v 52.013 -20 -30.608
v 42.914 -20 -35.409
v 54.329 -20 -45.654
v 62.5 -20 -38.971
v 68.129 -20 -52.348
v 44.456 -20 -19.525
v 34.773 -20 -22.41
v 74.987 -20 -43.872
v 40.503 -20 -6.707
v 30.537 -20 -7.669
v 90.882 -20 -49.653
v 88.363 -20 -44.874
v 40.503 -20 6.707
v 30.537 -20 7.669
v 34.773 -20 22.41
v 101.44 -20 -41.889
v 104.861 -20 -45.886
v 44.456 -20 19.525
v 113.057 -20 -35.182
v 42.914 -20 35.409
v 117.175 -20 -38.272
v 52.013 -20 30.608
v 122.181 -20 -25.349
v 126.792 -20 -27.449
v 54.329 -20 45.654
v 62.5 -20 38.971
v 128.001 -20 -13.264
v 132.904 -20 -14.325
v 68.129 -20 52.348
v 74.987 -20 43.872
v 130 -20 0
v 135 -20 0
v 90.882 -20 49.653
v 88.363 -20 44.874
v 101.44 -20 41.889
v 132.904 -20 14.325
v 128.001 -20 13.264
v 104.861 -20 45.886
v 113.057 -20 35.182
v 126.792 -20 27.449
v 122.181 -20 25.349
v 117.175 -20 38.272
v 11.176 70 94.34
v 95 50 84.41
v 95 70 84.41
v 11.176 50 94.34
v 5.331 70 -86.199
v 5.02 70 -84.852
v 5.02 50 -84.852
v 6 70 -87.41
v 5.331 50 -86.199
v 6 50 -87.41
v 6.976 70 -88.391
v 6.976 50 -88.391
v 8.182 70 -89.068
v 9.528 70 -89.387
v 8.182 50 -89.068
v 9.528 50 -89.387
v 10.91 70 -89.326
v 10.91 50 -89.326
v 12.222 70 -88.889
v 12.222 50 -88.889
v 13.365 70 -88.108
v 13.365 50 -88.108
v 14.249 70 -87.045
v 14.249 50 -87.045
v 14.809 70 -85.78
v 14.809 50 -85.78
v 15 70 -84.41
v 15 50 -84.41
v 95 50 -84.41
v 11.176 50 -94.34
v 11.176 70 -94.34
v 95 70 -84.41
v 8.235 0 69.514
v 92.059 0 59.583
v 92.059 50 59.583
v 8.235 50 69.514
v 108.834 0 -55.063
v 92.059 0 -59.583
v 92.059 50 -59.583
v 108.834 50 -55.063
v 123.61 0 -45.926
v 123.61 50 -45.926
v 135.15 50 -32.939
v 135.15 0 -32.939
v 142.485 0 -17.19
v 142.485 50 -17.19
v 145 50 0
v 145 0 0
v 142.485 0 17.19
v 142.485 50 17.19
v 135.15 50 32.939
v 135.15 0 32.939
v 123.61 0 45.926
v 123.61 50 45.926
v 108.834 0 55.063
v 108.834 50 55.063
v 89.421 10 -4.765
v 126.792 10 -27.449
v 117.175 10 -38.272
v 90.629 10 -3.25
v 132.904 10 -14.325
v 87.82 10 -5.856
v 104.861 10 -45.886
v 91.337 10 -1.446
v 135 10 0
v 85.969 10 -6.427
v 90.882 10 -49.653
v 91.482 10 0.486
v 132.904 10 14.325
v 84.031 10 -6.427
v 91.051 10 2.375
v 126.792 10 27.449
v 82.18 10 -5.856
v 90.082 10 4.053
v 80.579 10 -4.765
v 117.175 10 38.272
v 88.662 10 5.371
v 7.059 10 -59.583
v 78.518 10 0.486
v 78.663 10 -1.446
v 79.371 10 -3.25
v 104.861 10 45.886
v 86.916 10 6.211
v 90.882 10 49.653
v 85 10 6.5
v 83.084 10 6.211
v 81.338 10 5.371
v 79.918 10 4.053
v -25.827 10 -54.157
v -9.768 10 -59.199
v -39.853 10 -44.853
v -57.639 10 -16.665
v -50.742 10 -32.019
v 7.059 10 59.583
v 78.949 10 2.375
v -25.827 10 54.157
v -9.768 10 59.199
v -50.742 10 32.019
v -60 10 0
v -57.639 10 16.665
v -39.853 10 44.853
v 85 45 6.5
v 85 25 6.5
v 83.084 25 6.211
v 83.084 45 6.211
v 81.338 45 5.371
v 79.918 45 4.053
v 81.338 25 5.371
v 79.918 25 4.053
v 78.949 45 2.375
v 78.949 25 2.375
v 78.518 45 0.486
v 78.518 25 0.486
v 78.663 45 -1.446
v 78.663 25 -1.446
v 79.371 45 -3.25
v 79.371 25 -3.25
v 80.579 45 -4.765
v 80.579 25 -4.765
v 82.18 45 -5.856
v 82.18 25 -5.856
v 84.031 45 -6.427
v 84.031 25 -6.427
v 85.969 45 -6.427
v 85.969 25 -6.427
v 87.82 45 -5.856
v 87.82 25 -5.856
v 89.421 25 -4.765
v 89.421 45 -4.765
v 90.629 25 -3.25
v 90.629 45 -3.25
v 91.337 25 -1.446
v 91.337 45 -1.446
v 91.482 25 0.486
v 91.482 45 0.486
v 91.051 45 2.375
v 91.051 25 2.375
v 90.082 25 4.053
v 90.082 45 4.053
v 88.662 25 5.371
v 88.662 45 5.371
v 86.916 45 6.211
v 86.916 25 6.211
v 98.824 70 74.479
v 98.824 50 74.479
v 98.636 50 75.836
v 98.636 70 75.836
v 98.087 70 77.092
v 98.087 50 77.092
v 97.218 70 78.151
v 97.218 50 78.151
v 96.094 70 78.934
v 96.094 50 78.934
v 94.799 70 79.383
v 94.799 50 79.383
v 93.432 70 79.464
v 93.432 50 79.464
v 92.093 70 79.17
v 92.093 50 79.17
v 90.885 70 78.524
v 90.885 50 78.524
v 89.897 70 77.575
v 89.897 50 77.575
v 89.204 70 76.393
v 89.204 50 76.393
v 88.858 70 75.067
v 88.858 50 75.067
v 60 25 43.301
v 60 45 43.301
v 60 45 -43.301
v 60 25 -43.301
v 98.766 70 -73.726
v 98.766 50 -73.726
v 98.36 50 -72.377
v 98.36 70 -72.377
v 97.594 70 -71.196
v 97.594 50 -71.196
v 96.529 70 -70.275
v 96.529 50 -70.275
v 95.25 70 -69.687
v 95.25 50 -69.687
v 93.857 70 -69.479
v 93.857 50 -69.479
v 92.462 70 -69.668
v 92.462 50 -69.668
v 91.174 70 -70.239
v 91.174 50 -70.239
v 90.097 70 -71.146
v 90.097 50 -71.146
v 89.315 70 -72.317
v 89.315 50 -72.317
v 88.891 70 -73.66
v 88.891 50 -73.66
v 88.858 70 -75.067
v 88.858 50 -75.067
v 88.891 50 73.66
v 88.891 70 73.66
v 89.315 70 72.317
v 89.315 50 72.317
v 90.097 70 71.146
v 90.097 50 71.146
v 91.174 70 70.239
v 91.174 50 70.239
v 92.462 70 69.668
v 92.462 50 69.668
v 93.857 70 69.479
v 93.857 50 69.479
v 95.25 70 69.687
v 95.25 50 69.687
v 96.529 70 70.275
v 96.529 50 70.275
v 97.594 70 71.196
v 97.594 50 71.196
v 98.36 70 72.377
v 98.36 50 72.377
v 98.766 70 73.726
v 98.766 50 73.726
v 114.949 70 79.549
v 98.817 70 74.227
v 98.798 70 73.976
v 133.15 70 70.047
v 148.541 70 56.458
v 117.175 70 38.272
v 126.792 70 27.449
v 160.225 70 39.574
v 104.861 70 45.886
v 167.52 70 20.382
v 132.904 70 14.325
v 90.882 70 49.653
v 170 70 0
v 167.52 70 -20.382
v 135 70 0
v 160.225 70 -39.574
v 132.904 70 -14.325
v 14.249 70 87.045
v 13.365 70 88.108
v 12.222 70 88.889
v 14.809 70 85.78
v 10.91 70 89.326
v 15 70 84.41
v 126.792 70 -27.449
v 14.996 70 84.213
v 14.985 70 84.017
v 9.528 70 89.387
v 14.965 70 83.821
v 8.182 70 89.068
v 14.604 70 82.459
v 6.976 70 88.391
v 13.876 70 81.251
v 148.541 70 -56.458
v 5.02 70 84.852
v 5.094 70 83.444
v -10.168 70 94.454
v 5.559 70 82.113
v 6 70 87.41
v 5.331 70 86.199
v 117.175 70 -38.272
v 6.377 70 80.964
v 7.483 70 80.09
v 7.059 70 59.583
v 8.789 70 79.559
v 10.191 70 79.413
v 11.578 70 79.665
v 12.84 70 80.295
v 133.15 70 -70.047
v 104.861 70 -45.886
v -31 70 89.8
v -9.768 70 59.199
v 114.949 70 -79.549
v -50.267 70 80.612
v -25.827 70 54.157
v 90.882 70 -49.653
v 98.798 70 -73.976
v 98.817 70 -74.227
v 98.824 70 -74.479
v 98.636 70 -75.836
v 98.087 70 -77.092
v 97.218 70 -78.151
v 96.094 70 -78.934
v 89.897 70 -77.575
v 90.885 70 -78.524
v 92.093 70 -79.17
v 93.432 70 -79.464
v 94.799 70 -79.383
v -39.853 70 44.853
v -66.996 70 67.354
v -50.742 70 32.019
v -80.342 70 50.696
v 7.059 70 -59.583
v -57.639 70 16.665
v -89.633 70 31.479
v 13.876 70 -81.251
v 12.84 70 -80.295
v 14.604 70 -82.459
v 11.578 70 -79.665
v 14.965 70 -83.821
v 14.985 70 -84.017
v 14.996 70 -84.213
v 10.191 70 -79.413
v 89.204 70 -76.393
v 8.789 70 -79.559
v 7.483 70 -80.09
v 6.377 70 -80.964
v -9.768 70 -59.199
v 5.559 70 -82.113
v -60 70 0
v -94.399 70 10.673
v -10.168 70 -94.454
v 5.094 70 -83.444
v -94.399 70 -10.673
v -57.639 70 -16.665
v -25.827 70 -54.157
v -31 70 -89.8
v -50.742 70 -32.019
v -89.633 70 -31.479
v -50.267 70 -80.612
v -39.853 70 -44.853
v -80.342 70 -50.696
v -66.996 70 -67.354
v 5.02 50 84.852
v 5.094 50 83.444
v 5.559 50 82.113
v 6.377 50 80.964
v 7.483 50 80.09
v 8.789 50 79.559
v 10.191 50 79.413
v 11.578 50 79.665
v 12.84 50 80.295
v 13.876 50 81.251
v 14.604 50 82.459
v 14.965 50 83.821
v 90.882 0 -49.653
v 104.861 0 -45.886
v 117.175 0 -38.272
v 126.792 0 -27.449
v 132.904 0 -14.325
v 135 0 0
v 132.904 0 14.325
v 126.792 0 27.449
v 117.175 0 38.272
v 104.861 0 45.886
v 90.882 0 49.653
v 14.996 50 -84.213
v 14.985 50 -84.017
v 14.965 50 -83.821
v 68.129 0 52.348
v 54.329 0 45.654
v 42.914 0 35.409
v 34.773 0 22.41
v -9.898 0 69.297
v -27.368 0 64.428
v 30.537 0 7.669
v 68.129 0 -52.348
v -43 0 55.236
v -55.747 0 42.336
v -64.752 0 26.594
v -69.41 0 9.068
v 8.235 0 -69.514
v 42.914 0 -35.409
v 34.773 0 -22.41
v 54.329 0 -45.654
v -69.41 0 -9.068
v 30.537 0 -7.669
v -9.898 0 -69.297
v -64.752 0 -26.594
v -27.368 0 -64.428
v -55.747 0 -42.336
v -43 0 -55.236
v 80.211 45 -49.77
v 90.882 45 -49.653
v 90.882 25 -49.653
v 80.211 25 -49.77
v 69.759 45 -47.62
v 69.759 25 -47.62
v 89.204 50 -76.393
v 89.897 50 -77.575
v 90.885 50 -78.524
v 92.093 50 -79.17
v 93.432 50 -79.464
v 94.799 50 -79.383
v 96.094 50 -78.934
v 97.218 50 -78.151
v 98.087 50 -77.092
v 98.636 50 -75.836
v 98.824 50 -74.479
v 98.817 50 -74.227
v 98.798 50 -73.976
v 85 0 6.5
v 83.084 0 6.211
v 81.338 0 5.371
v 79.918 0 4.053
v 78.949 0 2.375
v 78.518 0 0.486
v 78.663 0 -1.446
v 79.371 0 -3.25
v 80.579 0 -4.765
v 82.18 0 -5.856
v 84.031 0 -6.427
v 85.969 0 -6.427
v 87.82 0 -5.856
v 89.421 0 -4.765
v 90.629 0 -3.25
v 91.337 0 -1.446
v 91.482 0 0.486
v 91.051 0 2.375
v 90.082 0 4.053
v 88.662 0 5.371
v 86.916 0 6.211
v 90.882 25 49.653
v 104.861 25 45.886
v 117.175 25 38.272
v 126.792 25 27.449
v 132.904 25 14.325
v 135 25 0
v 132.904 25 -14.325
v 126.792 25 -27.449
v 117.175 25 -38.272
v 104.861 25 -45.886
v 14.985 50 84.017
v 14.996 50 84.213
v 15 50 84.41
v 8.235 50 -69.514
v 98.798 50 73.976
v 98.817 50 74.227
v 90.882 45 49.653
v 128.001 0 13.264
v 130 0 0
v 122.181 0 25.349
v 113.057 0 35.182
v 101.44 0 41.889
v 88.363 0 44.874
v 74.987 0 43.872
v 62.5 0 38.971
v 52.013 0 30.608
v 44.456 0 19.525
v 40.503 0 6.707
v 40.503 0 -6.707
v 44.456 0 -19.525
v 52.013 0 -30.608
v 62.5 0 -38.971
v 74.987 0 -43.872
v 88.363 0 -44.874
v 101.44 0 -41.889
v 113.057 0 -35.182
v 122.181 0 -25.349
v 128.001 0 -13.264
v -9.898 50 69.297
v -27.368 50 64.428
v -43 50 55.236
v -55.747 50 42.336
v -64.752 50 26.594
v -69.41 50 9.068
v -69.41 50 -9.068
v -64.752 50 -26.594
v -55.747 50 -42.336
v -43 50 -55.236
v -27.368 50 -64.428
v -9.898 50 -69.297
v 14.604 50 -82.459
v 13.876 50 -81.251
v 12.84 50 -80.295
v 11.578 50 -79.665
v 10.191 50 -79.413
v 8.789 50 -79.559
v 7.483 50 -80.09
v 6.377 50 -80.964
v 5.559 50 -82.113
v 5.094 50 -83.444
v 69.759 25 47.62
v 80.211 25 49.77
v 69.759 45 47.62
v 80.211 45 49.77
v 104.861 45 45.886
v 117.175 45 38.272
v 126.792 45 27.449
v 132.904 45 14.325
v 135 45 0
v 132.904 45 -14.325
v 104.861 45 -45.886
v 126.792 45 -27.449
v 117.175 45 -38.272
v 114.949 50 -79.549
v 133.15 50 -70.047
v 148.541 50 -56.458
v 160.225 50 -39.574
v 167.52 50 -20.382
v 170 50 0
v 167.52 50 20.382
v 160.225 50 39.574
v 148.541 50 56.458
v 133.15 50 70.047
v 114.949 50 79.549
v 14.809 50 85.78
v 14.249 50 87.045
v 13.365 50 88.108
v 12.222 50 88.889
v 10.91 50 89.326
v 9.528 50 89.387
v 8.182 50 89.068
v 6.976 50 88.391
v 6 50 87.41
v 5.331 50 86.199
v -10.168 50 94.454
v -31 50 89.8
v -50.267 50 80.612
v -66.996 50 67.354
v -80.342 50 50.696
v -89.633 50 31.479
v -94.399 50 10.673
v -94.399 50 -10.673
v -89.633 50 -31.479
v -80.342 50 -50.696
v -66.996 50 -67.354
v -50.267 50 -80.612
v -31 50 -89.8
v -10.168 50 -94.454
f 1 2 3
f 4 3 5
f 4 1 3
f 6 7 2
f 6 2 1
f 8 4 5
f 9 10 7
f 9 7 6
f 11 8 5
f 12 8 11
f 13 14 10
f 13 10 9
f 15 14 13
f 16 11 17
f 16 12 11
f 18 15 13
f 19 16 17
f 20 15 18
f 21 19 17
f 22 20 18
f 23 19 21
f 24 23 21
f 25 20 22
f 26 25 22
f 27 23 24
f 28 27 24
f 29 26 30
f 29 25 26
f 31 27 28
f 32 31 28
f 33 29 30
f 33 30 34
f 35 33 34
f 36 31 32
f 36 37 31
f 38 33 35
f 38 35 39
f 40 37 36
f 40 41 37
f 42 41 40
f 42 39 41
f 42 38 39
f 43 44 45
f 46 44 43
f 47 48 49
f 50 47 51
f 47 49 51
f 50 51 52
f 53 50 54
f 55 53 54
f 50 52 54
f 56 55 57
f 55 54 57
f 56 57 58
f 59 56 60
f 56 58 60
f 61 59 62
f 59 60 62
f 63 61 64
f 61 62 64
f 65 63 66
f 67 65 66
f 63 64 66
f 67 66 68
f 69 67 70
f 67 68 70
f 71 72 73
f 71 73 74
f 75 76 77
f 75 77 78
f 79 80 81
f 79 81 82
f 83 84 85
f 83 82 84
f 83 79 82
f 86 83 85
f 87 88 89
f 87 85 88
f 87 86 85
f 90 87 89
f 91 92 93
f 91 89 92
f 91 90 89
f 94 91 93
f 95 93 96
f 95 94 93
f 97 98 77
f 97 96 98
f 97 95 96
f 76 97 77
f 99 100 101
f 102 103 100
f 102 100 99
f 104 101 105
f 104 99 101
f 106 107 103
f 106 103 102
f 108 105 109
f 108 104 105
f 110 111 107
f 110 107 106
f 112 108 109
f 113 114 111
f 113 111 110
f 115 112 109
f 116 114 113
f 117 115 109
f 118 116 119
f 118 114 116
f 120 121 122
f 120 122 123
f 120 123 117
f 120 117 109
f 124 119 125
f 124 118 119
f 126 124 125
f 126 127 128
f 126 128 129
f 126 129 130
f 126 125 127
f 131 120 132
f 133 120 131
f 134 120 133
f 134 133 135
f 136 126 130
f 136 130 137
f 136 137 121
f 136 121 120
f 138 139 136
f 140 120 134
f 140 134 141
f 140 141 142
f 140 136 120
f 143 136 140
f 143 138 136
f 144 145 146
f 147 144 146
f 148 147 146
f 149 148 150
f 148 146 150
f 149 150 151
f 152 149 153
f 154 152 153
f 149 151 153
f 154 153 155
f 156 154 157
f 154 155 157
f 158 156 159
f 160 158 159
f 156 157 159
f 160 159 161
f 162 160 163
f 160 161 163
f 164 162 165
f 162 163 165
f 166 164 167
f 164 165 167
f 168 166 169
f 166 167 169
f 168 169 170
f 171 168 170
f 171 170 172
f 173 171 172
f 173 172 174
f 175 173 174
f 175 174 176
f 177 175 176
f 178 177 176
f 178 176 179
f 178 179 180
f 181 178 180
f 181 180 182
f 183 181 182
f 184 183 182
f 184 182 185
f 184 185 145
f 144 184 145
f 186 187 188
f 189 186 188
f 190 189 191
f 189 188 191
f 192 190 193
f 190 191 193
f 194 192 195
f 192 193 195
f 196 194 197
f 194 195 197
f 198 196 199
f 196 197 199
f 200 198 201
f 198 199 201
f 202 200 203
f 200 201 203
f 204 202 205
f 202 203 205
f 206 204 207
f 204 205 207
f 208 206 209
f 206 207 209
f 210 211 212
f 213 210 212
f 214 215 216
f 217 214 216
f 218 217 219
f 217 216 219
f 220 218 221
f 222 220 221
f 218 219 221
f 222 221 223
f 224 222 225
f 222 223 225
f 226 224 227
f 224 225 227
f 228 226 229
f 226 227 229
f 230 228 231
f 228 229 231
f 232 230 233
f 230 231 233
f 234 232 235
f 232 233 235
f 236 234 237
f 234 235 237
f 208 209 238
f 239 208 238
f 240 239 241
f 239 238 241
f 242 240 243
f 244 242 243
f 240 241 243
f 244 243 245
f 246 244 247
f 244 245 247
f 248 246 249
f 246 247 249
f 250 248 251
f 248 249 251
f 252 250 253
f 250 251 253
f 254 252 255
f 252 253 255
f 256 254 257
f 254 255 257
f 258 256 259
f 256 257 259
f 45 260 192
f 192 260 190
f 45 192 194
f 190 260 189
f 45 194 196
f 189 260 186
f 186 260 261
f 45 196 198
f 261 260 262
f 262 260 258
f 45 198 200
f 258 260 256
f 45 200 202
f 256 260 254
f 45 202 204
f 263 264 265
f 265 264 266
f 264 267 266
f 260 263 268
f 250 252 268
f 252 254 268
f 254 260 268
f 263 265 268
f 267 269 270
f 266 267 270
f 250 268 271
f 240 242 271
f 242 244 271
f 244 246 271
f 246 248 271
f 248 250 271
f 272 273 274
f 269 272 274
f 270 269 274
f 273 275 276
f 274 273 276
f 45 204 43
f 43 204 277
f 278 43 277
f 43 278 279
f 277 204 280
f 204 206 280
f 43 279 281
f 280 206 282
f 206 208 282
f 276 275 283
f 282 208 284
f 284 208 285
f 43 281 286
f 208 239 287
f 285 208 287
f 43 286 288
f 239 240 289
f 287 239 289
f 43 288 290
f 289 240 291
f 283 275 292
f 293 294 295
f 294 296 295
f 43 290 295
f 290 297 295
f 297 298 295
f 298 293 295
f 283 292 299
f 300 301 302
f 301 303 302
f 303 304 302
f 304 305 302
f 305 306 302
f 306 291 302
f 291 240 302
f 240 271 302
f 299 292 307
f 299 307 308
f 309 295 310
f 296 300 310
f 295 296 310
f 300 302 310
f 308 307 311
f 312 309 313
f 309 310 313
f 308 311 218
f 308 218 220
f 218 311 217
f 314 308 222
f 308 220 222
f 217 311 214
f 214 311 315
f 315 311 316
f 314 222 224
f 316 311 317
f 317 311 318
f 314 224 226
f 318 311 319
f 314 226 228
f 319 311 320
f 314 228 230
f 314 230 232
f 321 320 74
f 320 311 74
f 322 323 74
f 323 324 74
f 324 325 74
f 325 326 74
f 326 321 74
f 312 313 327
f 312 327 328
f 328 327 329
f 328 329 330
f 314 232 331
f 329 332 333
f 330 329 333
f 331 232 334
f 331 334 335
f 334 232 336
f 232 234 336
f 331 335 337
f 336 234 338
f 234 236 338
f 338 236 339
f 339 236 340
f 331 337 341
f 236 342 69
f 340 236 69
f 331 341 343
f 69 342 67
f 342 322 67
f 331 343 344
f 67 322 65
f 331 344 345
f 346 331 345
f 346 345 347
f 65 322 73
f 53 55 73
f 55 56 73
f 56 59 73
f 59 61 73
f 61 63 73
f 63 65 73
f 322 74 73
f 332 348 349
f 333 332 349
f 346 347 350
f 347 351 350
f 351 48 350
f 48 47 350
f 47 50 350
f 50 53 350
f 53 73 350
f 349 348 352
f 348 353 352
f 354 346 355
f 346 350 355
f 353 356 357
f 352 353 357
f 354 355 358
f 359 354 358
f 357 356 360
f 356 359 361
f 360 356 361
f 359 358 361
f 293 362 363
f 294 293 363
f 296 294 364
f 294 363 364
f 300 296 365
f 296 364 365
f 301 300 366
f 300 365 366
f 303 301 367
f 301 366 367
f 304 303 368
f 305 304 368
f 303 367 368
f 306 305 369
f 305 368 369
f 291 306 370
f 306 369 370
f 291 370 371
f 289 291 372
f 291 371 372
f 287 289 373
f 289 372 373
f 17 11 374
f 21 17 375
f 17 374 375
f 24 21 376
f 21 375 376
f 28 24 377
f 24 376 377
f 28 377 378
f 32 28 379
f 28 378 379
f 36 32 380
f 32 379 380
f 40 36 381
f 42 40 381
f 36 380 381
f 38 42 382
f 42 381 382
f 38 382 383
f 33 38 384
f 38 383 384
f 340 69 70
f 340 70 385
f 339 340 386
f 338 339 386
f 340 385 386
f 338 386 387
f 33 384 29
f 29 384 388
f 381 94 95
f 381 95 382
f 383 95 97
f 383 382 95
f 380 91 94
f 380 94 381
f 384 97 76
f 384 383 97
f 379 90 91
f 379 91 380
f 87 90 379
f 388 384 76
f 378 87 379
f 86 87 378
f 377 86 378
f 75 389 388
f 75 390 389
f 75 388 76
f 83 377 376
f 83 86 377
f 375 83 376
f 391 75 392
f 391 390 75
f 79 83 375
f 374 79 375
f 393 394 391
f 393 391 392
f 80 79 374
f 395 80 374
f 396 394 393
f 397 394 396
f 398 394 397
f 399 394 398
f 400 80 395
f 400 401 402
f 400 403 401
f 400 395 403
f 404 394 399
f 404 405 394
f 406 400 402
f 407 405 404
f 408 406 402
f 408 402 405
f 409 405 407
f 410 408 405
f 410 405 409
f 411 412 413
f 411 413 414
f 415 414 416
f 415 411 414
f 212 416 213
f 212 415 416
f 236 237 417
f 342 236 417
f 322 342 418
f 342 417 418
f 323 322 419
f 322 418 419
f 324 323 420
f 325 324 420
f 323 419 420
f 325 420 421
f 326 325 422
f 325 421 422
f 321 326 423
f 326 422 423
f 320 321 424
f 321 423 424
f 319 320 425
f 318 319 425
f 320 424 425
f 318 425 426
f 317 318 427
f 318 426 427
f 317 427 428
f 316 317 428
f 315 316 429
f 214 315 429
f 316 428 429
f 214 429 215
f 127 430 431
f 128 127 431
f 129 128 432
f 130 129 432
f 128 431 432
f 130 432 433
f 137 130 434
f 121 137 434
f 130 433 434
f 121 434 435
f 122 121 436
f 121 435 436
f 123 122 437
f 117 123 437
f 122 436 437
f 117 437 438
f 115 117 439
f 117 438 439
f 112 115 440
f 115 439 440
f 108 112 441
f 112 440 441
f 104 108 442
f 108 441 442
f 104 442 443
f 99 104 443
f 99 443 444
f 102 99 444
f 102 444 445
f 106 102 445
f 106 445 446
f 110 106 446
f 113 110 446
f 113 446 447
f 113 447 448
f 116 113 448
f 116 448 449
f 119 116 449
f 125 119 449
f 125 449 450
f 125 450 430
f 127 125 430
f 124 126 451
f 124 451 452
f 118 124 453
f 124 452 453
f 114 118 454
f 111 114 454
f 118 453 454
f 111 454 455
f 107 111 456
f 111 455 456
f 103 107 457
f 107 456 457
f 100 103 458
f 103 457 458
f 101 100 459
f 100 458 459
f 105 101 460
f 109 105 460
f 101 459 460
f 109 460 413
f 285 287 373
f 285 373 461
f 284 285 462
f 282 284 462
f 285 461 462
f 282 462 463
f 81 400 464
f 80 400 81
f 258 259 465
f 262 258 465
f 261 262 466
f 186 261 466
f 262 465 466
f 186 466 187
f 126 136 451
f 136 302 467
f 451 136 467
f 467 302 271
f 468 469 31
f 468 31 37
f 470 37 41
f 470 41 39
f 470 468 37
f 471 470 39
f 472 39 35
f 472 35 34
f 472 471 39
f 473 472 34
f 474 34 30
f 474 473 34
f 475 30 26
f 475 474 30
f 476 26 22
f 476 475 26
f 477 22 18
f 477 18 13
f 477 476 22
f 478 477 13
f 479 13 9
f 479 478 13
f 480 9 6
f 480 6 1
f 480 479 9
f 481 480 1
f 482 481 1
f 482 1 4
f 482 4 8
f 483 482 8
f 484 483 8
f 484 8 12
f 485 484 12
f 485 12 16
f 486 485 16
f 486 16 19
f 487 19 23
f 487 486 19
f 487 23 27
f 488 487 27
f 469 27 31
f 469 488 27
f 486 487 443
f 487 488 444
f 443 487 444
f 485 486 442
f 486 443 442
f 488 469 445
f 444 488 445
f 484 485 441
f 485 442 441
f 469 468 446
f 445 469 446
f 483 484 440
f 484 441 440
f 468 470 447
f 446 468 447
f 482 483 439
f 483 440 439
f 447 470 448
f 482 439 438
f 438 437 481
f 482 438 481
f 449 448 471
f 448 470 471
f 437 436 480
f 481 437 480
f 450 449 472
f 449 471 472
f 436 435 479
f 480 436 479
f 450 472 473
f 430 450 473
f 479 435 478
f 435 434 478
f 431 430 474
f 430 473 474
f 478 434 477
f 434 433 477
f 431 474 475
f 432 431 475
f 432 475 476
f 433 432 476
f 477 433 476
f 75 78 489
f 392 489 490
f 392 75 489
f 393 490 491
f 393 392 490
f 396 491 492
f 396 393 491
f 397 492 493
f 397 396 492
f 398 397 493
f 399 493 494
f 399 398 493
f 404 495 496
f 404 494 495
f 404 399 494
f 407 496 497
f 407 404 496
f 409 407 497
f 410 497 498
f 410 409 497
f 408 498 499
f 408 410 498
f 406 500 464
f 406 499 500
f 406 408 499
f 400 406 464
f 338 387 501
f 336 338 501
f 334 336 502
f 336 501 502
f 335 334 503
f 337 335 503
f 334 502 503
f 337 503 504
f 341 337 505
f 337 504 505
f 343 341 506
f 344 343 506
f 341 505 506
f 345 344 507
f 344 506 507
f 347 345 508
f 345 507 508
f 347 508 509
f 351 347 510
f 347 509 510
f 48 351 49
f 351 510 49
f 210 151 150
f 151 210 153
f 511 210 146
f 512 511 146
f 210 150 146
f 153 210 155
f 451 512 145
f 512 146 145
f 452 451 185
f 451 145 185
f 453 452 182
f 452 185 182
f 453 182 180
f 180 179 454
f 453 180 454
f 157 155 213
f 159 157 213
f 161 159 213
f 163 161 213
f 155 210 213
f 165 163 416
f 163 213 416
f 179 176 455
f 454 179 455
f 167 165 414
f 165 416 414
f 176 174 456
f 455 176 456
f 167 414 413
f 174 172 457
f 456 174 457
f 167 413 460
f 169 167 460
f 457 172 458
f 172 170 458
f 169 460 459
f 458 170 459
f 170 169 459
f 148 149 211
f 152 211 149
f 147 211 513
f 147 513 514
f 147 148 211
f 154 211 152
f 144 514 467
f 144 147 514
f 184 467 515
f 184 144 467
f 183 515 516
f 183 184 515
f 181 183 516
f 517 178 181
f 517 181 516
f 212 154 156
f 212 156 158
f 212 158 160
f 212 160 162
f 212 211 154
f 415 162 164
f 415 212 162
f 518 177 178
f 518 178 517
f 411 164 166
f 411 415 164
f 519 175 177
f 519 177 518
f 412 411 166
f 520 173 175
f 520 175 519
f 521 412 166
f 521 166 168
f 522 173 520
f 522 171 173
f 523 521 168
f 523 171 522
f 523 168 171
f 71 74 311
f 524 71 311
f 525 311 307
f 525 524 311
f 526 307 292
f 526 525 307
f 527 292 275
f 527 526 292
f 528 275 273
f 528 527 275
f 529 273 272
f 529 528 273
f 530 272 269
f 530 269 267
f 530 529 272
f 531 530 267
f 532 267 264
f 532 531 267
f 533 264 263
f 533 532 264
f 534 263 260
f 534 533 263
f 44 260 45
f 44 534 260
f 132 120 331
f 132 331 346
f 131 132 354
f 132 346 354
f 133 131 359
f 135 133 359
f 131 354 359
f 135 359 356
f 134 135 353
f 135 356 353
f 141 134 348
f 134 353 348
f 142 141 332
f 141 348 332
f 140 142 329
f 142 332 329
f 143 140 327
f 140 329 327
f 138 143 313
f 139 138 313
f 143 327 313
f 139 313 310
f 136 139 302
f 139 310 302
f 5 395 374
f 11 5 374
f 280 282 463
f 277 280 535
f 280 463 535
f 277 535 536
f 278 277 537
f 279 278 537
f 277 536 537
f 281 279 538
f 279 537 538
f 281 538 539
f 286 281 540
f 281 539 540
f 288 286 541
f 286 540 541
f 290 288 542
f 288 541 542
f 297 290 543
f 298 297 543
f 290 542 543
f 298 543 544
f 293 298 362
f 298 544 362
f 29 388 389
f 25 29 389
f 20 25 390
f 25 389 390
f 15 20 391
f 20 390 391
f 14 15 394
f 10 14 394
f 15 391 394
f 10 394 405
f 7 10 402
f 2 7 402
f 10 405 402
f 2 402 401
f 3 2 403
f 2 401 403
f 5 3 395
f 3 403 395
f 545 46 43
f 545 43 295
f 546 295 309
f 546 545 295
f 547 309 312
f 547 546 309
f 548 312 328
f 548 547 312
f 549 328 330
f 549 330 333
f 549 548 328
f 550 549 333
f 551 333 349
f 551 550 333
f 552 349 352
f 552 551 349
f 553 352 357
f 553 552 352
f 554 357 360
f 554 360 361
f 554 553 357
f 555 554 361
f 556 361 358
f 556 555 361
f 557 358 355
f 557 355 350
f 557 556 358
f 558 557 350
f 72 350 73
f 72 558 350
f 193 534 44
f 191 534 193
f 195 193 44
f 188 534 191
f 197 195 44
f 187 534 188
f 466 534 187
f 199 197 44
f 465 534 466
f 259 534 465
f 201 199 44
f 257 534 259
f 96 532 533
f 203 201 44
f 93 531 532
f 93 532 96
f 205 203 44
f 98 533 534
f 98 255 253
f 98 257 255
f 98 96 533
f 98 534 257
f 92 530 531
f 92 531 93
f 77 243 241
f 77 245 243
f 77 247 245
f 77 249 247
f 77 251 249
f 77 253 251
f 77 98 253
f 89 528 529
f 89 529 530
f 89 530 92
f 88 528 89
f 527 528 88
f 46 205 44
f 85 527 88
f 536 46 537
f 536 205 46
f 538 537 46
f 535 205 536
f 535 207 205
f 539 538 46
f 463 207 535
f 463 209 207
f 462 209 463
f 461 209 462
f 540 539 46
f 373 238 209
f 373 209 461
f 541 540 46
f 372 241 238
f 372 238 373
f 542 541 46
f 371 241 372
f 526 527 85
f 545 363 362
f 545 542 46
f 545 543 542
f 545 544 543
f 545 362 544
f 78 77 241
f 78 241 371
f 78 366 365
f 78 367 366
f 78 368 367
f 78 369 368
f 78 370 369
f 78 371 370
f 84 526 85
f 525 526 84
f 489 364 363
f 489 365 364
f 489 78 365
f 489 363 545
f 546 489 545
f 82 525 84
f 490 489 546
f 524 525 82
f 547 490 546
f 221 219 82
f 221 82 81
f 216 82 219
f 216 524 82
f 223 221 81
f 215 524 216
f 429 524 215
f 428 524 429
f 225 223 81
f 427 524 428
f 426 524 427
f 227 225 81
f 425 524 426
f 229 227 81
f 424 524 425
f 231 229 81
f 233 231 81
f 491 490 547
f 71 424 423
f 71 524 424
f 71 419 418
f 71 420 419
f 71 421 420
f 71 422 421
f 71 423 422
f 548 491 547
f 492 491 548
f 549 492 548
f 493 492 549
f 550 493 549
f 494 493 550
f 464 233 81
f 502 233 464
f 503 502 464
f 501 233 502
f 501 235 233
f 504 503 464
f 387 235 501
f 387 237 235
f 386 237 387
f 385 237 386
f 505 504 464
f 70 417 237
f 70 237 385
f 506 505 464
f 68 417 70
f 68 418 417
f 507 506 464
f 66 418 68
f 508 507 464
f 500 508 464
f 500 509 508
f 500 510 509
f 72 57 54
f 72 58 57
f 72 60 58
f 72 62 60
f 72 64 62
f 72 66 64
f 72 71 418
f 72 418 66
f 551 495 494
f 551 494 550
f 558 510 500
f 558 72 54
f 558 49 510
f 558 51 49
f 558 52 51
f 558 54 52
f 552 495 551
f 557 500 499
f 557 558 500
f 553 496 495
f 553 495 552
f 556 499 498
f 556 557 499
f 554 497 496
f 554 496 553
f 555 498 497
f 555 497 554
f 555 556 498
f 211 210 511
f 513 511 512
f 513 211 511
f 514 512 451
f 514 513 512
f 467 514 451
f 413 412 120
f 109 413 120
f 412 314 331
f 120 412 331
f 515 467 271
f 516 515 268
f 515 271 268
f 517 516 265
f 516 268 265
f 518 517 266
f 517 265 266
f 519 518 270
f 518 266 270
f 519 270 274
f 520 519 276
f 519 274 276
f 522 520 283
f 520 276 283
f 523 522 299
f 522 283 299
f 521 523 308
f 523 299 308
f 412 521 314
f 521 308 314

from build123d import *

# Parameters (mm, degrees)
EXTRUDE_2_DEPTH     = 70
CUT_EXTRUDE_1_DEPTH = 90
EXTRUDE_3_OUTLINE_R = 45
EXTRUDE_3_DEPTH     = 20
EXTRUDE_START       = -10
EXTRUDE_4_DEPTH     = 10
EXTRUDE_START_2     = -20
EXTRUDE_5_DEPTH     = 20
CUT_EXTRUDE_2_DEPTH = 207.942020866
EXTRUDE_START_3     = 35
SKETCH_13_R         = 50
EXTRUDE_6_DEPTH     = 35
CUT_EXTRUDE_START   = 15
CUT_EXTRUDE_3_DEPTH = 15
SKETCH_15_R         = 6.5
CUT_EXTRUDE_4_DEPTH = 207.942020866
CUT_EXTRUDE_5_REACH = 207.305


# Read off the part's stored shape, not the designer's step: 凸台-拉伸3
with BuildPart() as part:
    # 草图1 → 凸台-拉伸2 (new body)
    with BuildSketch(Plane(origin=(0, 0, 0), x_dir=(1, 0, 0), z_dir=(0, 1, 0))):
        with BuildLine():
            Line((8.235294118, 69.513883008), (92.058823529, 59.583328292))
            ThreePointArc((92.058823529, 59.583328292), (145, 0), (92.058823529, -59.583328292))
            Line((92.058823529, -59.583328292), (8.235294118, -69.513883008))
            ThreePointArc((8.235294118, -69.513883008), (-70, 0), (8.235294118, 69.513883008))
        make_face()
    extrude(amount=EXTRUDE_2_DEPTH)

    # 草图2 → 切除-拉伸1 (cut)
    with BuildSketch(Plane(origin=(0, 70, 0), x_dir=(1, 0, 0), z_dir=(0, 1, 0))):
        with BuildLine():
            Line((7.058823529, -59.583328292), (90.882352941, -49.652773577))
            ThreePointArc((90.882352941, -49.652773577), (135, 0), (90.882352941, 49.652773577))
            Line((90.882352941, 49.652773577), (7.058823529, 59.583328292))
            ThreePointArc((7.058823529, 59.583328292), (-60, 0), (7.058823529, -59.583328292))
        make_face()
    extrude(amount=-CUT_EXTRUDE_1_DEPTH, mode=Mode.SUBTRACT)



with BuildPart() as body_2:
    # 凸台-拉伸3 outline → 凸台-拉伸3 (new body)
    with BuildSketch(Plane.XZ):
        with BuildLine():
            ThreePointArc((90.882352941, -49.652773577), (135, 0), (90.882352941, 49.652773577))
            Line((90.882352941, 49.652773577), (68.128593603, 52.348406339))
            ThreePointArc((68.128593603, 52.348406339), (30, 0), (68.128593603, -52.348406339))
            Line((68.128593603, -52.348406339), (90.882352941, -49.652773577))
        make_face()
        with Locations((85, 0)):
            Circle(EXTRUDE_3_OUTLINE_R, mode=Mode.SUBTRACT)
    extrude(amount=EXTRUDE_3_DEPTH)


with BuildPart() as part_1:
    add(part.part)

    add(body_2.part)  # 凸台-拉伸4 merges body 2
    # 草图8 → 凸台-拉伸4 (add)
    with BuildSketch(Plane.XZ.offset(EXTRUDE_START)):
        with BuildLine():
            Line((90.882352941, -49.652773577), (7.058823529, -59.583328292))
            ThreePointArc((7.058823529, -59.583328292), (-60, 0), (7.058823529, 59.583328292))
            Line((7.058823529, 59.583328292), (90.882352941, 49.652773577))
            ThreePointArc((90.882352941, 49.652773577), (135, 0), (90.882352941, -49.652773577))
        make_face()
    extrude(amount=EXTRUDE_4_DEPTH)

    # 草图9 → 凸台-拉伸5 (add)
    with BuildSketch(Plane(origin=(0, 70, 0), x_dir=(1, 0, 0), z_dir=(0, 1, 0)).offset(EXTRUDE_START_2)):
        with BuildLine():
            Line((11.176470588, 94.340269796), (95, 84.409715081))
            ThreePointArc((95, 84.409715081), (170, 0), (95, -84.409715081))
            Line((95, -84.409715081), (11.176470588, -94.340269796))
            ThreePointArc((11.176470588, -94.340269796), (-95, 0), (11.176470588, 94.340269796))
        make_face()
        with BuildLine():
            Line((8.235294118, -69.513883008), (92.058823529, -59.583328292))
            ThreePointArc((92.058823529, -59.583328292), (145, 0), (92.058823529, 59.583328292))
            Line((92.058823529, 59.583328292), (8.235294118, 69.513883008))
            ThreePointArc((8.235294118, 69.513883008), (-70, 0), (8.235294118, -69.513883008))
        make_face(mode=Mode.SUBTRACT)
    extrude(amount=EXTRUDE_5_DEPTH)

    # 草图10 → 切除-拉伸2 (cut, through all)
    with BuildSketch(Plane.XZ.offset(-50)):
        with BuildLine():
            ThreePointArc((88.858252054, 75.067395659), (93.152609723, 69.524378153), (98.766439672, 73.725742714))
            ThreePointArc((98.766439672, 73.725742714), (96.301264767, 74.143653907), (93.823529412, 74.479160365))
            Line((93.823529412, 74.479160365), (88.858252054, 75.067395659))
        make_face()
        with BuildLine():
            ThreePointArc((93.823529412, 74.479160365), (96.301264767, 74.143653907), (98.766439672, 73.725742714))
            ThreePointArc((98.766439672, 73.725742714), (98.809236548, 74.101371603), (98.823529412, 74.479160365))
            ThreePointArc((98.823529412, 74.479160365), (94.11815902, 79.470472156), (88.858252054, 75.067395659))
            Line((88.858252054, 75.067395659), (93.823529412, 74.479160365))
        make_face()
        with BuildLine():
            ThreePointArc((88.858252054, 75.067395659), (93.152609723, 69.524378153), (98.766439672, 73.725742714))
            ThreePointArc((98.766439672, 73.725742714), (96.301264767, 74.143653907), (93.823529412, 74.479160365))
            Line((93.823529412, 74.479160365), (88.858252054, 75.067395659))
        make_face()
        with BuildLine():
            ThreePointArc((93.823529412, 74.479160365), (96.301264767, 74.143653907), (98.766439672, 73.725742714))
            ThreePointArc((98.766439672, 73.725742714), (98.809236548, 74.101371603), (98.823529412, 74.479160365))
            ThreePointArc((98.823529412, 74.479160365), (94.11815902, 79.470472156), (88.858252054, 75.067395659))
            Line((88.858252054, 75.067395659), (93.823529412, 74.479160365))
        make_face()
        with BuildLine():
            ThreePointArc((10, 84.409715081), (7.513035126, 84.667315436), (5.01956968, 84.851658323))
            ThreePointArc((5.01956968, 84.851658323), (9.484855013, 79.436323316), (14.965277358, 83.821479787))
            Line((14.965277358, 83.821479787), (10, 84.409715081))
        make_face()
        with BuildLine():
            ThreePointArc((15, 84.409715081), (10.221188156, 89.404820265), (5.01956968, 84.851658323))
            ThreePointArc((5.01956968, 84.851658323), (7.513035126, 84.667315436), (10, 84.409715081))
            Line((10, 84.409715081), (14.965277358, 83.821479787))
            ThreePointArc((14.965277358, 83.821479787), (14.991311791, 84.115085473), (15, 84.409715081))
        make_face()
        with BuildLine():
            ThreePointArc((10, 84.409715081), (7.513035126, 84.667315436), (5.01956968, 84.851658323))
            ThreePointArc((5.01956968, 84.851658323), (9.484855013, 79.436323316), (14.965277358, 83.821479787))
            Line((14.965277358, 83.821479787), (10, 84.409715081))
        make_face()
        with BuildLine():
            ThreePointArc((15, 84.409715081), (10.221188156, 89.404820265), (5.01956968, 84.851658323))
            ThreePointArc((5.01956968, 84.851658323), (7.513035126, 84.667315436), (10, 84.409715081))
            Line((10, 84.409715081), (14.965277358, 83.821479787))
            ThreePointArc((14.965277358, 83.821479787), (14.991311791, 84.115085473), (15, 84.409715081))
        make_face()
        with BuildLine():
            ThreePointArc((5.01956968, -84.851658323), (7.513035126, -84.667315436), (10, -84.409715081))
            Line((10, -84.409715081), (14.965277358, -83.821479787))
            ThreePointArc((14.965277358, -83.821479787), (9.484855013, -79.436323316), (5.01956968, -84.851658323))
        make_face()
        with BuildLine():
            Line((14.965277358, -83.821479787), (10, -84.409715081))
            ThreePointArc((10, -84.409715081), (7.513035126, -84.667315436), (5.01956968, -84.851658323))
            ThreePointArc((5.01956968, -84.851658323), (10.221188156, -89.404820265), (15, -84.409715081))
            ThreePointArc((15, -84.409715081), (14.991311791, -84.115085473), (14.965277358, -83.821479787))
        make_face()
        with BuildLine():
            ThreePointArc((5.01956968, -84.851658323), (7.513035126, -84.667315436), (10, -84.409715081))
            Line((10, -84.409715081), (14.965277358, -83.821479787))
            ThreePointArc((14.965277358, -83.821479787), (9.484855013, -79.436323316), (5.01956968, -84.851658323))
        make_face()
        with BuildLine():
            Line((14.965277358, -83.821479787), (10, -84.409715081))
            ThreePointArc((10, -84.409715081), (7.513035126, -84.667315436), (5.01956968, -84.851658323))
            ThreePointArc((5.01956968, -84.851658323), (10.221188156, -89.404820265), (15, -84.409715081))
            ThreePointArc((15, -84.409715081), (14.991311791, -84.115085473), (14.965277358, -83.821479787))
        make_face()
        with BuildLine():
            ThreePointArc((98.766439672, -73.725742714), (93.152609723, -69.524378153), (88.858252054, -75.067395659))
            Line((88.858252054, -75.067395659), (93.823529412, -74.479160365))
            ThreePointArc((93.823529412, -74.479160365), (96.301264767, -74.143653907), (98.766439672, -73.725742714))
        make_face()
        with BuildLine():
            Line((93.823529412, -74.479160365), (88.858252054, -75.067395659))
            ThreePointArc((88.858252054, -75.067395659), (94.11815902, -79.470472156), (98.823529412, -74.479160365))
            ThreePointArc((98.823529412, -74.479160365), (98.809236548, -74.101371603), (98.766439672, -73.725742714))
            ThreePointArc((98.766439672, -73.725742714), (96.301264767, -74.143653907), (93.823529412, -74.479160365))
        make_face()
        with BuildLine():
            ThreePointArc((98.766439672, -73.725742714), (93.152609723, -69.524378153), (88.858252054, -75.067395659))
            Line((88.858252054, -75.067395659), (93.823529412, -74.479160365))
            ThreePointArc((93.823529412, -74.479160365), (96.301264767, -74.143653907), (98.766439672, -73.725742714))
        make_face()
        with BuildLine():
            Line((93.823529412, -74.479160365), (88.858252054, -75.067395659))
            ThreePointArc((88.858252054, -75.067395659), (94.11815902, -79.470472156), (98.823529412, -74.479160365))
            ThreePointArc((98.823529412, -74.479160365), (98.809236548, -74.101371603), (98.766439672, -73.725742714))
            ThreePointArc((98.766439672, -73.725742714), (96.301264767, -74.143653907), (93.823529412, -74.479160365))
        make_face()
    extrude(amount=-CUT_EXTRUDE_2_DEPTH, mode=Mode.SUBTRACT)

    # 草图13 → 凸台-拉伸6 (add)
    with BuildSketch(Plane(origin=(0, 10, 0), x_dir=(1, 0, 0), z_dir=(0, 1, 0)).offset(EXTRUDE_START_3)):
        with Locations((85, 0)):
            Circle(SKETCH_13_R)
    extrude(amount=-EXTRUDE_6_DEPTH)

    # 草图14 → 切除-拉伸3 (cut)
    with BuildSketch(Plane(origin=(0, 10, 0), x_dir=(1, 0, 0), z_dir=(0, 1, 0)).offset(CUT_EXTRUDE_START)):
        with BuildLine():
            ThreePointArc((90.882352941, -49.652773577), (135, 0), (90.882352941, 49.652773577))
            ThreePointArc((90.882352941, 49.652773577), (35, 0), (90.882352941, -49.652773577))
        make_face()
    extrude(amount=-CUT_EXTRUDE_3_DEPTH, mode=Mode.SUBTRACT)

    # 草图15 → 切除-拉伸4 (cut, through all)
    with BuildSketch(Plane.XZ):
        with Locations(Location((85, 0, 0), (0, 0, 90))):
            Circle(SKETCH_15_R)
    extrude(amount=-CUT_EXTRUDE_4_DEPTH, mode=Mode.SUBTRACT)

    # 草图16 → 切除-拉伸5 (cut, up to next)
    with BuildSketch(Plane(origin=(0, 45, 0), x_dir=(1, 0, 0), z_dir=(0, 1, 0)), mode=Mode.PRIVATE) as cut_extrude_5_sk1:
        with BuildLine():
            Line((60, 0), (60, 43.301270189))
            ThreePointArc((60, 43.301270189), (41.698729811, 25), (35, 0))
            Line((35, 0), (60, 0))
        make_face()
    cut_extrude_5_tool1 = extrude(cut_extrude_5_sk1.sketch, amount=-CUT_EXTRUDE_5_REACH, mode=Mode.PRIVATE) & part_1.part
    # 草图16 → 切除-拉伸5 (cut, up to next)
    with BuildSketch(Plane(origin=(0, 45, 0), x_dir=(1, 0, 0), z_dir=(0, 1, 0)), mode=Mode.PRIVATE) as cut_extrude_5_sk2:
        with BuildLine():
            ThreePointArc((35, 0), (41.698729811, -25), (60, -43.301270189))
            Line((60, -43.301270189), (60, 0))
            Line((60, 0), (35, 0))
        make_face()
    cut_extrude_5_tool2 = extrude(cut_extrude_5_sk2.sketch, amount=-CUT_EXTRUDE_5_REACH, mode=Mode.PRIVATE) & part_1.part
    # 草图16 → 切除-拉伸5 (cut, up to next)
    with BuildSketch(Plane(origin=(0, 45, 0), x_dir=(1, 0, 0), z_dir=(0, 1, 0)), mode=Mode.PRIVATE) as cut_extrude_5_sk3:
        with BuildLine():
            Line((60, 0), (60, 43.301270189))
            ThreePointArc((60, 43.301270189), (41.698729811, 25), (35, 0))
            Line((35, 0), (60, 0))
        make_face()
    cut_extrude_5_tool3 = extrude(cut_extrude_5_sk3.sketch, amount=-CUT_EXTRUDE_5_REACH, mode=Mode.PRIVATE) & part_1.part
    # 草图16 → 切除-拉伸5 (cut, up to next)
    with BuildSketch(Plane(origin=(0, 45, 0), x_dir=(1, 0, 0), z_dir=(0, 1, 0)), mode=Mode.PRIVATE) as cut_extrude_5_sk4:
        with BuildLine():
            ThreePointArc((35, 0), (41.698729811, -25), (60, -43.301270189))
            Line((60, -43.301270189), (60, 0))
            Line((60, 0), (35, 0))
        make_face()
    cut_extrude_5_tool4 = extrude(cut_extrude_5_sk4.sketch, amount=-CUT_EXTRUDE_5_REACH, mode=Mode.PRIVATE) & part_1.part
    add(cut_extrude_5_tool1.solids().sort_by_distance((49.748992, 45, -16.960149))[0], mode=Mode.SUBTRACT)
    add(cut_extrude_5_tool2.solids().sort_by_distance((49.748992, 45, 16.960149))[0], mode=Mode.SUBTRACT)
    add(cut_extrude_5_tool3.solids().sort_by_distance((49.748992, 45, -16.960149))[0], mode=Mode.SUBTRACT)
    add(cut_extrude_5_tool4.solids().sort_by_distance((49.748992, 45, 16.960149))[0], mode=Mode.SUBTRACT)


solid = part_1.part
